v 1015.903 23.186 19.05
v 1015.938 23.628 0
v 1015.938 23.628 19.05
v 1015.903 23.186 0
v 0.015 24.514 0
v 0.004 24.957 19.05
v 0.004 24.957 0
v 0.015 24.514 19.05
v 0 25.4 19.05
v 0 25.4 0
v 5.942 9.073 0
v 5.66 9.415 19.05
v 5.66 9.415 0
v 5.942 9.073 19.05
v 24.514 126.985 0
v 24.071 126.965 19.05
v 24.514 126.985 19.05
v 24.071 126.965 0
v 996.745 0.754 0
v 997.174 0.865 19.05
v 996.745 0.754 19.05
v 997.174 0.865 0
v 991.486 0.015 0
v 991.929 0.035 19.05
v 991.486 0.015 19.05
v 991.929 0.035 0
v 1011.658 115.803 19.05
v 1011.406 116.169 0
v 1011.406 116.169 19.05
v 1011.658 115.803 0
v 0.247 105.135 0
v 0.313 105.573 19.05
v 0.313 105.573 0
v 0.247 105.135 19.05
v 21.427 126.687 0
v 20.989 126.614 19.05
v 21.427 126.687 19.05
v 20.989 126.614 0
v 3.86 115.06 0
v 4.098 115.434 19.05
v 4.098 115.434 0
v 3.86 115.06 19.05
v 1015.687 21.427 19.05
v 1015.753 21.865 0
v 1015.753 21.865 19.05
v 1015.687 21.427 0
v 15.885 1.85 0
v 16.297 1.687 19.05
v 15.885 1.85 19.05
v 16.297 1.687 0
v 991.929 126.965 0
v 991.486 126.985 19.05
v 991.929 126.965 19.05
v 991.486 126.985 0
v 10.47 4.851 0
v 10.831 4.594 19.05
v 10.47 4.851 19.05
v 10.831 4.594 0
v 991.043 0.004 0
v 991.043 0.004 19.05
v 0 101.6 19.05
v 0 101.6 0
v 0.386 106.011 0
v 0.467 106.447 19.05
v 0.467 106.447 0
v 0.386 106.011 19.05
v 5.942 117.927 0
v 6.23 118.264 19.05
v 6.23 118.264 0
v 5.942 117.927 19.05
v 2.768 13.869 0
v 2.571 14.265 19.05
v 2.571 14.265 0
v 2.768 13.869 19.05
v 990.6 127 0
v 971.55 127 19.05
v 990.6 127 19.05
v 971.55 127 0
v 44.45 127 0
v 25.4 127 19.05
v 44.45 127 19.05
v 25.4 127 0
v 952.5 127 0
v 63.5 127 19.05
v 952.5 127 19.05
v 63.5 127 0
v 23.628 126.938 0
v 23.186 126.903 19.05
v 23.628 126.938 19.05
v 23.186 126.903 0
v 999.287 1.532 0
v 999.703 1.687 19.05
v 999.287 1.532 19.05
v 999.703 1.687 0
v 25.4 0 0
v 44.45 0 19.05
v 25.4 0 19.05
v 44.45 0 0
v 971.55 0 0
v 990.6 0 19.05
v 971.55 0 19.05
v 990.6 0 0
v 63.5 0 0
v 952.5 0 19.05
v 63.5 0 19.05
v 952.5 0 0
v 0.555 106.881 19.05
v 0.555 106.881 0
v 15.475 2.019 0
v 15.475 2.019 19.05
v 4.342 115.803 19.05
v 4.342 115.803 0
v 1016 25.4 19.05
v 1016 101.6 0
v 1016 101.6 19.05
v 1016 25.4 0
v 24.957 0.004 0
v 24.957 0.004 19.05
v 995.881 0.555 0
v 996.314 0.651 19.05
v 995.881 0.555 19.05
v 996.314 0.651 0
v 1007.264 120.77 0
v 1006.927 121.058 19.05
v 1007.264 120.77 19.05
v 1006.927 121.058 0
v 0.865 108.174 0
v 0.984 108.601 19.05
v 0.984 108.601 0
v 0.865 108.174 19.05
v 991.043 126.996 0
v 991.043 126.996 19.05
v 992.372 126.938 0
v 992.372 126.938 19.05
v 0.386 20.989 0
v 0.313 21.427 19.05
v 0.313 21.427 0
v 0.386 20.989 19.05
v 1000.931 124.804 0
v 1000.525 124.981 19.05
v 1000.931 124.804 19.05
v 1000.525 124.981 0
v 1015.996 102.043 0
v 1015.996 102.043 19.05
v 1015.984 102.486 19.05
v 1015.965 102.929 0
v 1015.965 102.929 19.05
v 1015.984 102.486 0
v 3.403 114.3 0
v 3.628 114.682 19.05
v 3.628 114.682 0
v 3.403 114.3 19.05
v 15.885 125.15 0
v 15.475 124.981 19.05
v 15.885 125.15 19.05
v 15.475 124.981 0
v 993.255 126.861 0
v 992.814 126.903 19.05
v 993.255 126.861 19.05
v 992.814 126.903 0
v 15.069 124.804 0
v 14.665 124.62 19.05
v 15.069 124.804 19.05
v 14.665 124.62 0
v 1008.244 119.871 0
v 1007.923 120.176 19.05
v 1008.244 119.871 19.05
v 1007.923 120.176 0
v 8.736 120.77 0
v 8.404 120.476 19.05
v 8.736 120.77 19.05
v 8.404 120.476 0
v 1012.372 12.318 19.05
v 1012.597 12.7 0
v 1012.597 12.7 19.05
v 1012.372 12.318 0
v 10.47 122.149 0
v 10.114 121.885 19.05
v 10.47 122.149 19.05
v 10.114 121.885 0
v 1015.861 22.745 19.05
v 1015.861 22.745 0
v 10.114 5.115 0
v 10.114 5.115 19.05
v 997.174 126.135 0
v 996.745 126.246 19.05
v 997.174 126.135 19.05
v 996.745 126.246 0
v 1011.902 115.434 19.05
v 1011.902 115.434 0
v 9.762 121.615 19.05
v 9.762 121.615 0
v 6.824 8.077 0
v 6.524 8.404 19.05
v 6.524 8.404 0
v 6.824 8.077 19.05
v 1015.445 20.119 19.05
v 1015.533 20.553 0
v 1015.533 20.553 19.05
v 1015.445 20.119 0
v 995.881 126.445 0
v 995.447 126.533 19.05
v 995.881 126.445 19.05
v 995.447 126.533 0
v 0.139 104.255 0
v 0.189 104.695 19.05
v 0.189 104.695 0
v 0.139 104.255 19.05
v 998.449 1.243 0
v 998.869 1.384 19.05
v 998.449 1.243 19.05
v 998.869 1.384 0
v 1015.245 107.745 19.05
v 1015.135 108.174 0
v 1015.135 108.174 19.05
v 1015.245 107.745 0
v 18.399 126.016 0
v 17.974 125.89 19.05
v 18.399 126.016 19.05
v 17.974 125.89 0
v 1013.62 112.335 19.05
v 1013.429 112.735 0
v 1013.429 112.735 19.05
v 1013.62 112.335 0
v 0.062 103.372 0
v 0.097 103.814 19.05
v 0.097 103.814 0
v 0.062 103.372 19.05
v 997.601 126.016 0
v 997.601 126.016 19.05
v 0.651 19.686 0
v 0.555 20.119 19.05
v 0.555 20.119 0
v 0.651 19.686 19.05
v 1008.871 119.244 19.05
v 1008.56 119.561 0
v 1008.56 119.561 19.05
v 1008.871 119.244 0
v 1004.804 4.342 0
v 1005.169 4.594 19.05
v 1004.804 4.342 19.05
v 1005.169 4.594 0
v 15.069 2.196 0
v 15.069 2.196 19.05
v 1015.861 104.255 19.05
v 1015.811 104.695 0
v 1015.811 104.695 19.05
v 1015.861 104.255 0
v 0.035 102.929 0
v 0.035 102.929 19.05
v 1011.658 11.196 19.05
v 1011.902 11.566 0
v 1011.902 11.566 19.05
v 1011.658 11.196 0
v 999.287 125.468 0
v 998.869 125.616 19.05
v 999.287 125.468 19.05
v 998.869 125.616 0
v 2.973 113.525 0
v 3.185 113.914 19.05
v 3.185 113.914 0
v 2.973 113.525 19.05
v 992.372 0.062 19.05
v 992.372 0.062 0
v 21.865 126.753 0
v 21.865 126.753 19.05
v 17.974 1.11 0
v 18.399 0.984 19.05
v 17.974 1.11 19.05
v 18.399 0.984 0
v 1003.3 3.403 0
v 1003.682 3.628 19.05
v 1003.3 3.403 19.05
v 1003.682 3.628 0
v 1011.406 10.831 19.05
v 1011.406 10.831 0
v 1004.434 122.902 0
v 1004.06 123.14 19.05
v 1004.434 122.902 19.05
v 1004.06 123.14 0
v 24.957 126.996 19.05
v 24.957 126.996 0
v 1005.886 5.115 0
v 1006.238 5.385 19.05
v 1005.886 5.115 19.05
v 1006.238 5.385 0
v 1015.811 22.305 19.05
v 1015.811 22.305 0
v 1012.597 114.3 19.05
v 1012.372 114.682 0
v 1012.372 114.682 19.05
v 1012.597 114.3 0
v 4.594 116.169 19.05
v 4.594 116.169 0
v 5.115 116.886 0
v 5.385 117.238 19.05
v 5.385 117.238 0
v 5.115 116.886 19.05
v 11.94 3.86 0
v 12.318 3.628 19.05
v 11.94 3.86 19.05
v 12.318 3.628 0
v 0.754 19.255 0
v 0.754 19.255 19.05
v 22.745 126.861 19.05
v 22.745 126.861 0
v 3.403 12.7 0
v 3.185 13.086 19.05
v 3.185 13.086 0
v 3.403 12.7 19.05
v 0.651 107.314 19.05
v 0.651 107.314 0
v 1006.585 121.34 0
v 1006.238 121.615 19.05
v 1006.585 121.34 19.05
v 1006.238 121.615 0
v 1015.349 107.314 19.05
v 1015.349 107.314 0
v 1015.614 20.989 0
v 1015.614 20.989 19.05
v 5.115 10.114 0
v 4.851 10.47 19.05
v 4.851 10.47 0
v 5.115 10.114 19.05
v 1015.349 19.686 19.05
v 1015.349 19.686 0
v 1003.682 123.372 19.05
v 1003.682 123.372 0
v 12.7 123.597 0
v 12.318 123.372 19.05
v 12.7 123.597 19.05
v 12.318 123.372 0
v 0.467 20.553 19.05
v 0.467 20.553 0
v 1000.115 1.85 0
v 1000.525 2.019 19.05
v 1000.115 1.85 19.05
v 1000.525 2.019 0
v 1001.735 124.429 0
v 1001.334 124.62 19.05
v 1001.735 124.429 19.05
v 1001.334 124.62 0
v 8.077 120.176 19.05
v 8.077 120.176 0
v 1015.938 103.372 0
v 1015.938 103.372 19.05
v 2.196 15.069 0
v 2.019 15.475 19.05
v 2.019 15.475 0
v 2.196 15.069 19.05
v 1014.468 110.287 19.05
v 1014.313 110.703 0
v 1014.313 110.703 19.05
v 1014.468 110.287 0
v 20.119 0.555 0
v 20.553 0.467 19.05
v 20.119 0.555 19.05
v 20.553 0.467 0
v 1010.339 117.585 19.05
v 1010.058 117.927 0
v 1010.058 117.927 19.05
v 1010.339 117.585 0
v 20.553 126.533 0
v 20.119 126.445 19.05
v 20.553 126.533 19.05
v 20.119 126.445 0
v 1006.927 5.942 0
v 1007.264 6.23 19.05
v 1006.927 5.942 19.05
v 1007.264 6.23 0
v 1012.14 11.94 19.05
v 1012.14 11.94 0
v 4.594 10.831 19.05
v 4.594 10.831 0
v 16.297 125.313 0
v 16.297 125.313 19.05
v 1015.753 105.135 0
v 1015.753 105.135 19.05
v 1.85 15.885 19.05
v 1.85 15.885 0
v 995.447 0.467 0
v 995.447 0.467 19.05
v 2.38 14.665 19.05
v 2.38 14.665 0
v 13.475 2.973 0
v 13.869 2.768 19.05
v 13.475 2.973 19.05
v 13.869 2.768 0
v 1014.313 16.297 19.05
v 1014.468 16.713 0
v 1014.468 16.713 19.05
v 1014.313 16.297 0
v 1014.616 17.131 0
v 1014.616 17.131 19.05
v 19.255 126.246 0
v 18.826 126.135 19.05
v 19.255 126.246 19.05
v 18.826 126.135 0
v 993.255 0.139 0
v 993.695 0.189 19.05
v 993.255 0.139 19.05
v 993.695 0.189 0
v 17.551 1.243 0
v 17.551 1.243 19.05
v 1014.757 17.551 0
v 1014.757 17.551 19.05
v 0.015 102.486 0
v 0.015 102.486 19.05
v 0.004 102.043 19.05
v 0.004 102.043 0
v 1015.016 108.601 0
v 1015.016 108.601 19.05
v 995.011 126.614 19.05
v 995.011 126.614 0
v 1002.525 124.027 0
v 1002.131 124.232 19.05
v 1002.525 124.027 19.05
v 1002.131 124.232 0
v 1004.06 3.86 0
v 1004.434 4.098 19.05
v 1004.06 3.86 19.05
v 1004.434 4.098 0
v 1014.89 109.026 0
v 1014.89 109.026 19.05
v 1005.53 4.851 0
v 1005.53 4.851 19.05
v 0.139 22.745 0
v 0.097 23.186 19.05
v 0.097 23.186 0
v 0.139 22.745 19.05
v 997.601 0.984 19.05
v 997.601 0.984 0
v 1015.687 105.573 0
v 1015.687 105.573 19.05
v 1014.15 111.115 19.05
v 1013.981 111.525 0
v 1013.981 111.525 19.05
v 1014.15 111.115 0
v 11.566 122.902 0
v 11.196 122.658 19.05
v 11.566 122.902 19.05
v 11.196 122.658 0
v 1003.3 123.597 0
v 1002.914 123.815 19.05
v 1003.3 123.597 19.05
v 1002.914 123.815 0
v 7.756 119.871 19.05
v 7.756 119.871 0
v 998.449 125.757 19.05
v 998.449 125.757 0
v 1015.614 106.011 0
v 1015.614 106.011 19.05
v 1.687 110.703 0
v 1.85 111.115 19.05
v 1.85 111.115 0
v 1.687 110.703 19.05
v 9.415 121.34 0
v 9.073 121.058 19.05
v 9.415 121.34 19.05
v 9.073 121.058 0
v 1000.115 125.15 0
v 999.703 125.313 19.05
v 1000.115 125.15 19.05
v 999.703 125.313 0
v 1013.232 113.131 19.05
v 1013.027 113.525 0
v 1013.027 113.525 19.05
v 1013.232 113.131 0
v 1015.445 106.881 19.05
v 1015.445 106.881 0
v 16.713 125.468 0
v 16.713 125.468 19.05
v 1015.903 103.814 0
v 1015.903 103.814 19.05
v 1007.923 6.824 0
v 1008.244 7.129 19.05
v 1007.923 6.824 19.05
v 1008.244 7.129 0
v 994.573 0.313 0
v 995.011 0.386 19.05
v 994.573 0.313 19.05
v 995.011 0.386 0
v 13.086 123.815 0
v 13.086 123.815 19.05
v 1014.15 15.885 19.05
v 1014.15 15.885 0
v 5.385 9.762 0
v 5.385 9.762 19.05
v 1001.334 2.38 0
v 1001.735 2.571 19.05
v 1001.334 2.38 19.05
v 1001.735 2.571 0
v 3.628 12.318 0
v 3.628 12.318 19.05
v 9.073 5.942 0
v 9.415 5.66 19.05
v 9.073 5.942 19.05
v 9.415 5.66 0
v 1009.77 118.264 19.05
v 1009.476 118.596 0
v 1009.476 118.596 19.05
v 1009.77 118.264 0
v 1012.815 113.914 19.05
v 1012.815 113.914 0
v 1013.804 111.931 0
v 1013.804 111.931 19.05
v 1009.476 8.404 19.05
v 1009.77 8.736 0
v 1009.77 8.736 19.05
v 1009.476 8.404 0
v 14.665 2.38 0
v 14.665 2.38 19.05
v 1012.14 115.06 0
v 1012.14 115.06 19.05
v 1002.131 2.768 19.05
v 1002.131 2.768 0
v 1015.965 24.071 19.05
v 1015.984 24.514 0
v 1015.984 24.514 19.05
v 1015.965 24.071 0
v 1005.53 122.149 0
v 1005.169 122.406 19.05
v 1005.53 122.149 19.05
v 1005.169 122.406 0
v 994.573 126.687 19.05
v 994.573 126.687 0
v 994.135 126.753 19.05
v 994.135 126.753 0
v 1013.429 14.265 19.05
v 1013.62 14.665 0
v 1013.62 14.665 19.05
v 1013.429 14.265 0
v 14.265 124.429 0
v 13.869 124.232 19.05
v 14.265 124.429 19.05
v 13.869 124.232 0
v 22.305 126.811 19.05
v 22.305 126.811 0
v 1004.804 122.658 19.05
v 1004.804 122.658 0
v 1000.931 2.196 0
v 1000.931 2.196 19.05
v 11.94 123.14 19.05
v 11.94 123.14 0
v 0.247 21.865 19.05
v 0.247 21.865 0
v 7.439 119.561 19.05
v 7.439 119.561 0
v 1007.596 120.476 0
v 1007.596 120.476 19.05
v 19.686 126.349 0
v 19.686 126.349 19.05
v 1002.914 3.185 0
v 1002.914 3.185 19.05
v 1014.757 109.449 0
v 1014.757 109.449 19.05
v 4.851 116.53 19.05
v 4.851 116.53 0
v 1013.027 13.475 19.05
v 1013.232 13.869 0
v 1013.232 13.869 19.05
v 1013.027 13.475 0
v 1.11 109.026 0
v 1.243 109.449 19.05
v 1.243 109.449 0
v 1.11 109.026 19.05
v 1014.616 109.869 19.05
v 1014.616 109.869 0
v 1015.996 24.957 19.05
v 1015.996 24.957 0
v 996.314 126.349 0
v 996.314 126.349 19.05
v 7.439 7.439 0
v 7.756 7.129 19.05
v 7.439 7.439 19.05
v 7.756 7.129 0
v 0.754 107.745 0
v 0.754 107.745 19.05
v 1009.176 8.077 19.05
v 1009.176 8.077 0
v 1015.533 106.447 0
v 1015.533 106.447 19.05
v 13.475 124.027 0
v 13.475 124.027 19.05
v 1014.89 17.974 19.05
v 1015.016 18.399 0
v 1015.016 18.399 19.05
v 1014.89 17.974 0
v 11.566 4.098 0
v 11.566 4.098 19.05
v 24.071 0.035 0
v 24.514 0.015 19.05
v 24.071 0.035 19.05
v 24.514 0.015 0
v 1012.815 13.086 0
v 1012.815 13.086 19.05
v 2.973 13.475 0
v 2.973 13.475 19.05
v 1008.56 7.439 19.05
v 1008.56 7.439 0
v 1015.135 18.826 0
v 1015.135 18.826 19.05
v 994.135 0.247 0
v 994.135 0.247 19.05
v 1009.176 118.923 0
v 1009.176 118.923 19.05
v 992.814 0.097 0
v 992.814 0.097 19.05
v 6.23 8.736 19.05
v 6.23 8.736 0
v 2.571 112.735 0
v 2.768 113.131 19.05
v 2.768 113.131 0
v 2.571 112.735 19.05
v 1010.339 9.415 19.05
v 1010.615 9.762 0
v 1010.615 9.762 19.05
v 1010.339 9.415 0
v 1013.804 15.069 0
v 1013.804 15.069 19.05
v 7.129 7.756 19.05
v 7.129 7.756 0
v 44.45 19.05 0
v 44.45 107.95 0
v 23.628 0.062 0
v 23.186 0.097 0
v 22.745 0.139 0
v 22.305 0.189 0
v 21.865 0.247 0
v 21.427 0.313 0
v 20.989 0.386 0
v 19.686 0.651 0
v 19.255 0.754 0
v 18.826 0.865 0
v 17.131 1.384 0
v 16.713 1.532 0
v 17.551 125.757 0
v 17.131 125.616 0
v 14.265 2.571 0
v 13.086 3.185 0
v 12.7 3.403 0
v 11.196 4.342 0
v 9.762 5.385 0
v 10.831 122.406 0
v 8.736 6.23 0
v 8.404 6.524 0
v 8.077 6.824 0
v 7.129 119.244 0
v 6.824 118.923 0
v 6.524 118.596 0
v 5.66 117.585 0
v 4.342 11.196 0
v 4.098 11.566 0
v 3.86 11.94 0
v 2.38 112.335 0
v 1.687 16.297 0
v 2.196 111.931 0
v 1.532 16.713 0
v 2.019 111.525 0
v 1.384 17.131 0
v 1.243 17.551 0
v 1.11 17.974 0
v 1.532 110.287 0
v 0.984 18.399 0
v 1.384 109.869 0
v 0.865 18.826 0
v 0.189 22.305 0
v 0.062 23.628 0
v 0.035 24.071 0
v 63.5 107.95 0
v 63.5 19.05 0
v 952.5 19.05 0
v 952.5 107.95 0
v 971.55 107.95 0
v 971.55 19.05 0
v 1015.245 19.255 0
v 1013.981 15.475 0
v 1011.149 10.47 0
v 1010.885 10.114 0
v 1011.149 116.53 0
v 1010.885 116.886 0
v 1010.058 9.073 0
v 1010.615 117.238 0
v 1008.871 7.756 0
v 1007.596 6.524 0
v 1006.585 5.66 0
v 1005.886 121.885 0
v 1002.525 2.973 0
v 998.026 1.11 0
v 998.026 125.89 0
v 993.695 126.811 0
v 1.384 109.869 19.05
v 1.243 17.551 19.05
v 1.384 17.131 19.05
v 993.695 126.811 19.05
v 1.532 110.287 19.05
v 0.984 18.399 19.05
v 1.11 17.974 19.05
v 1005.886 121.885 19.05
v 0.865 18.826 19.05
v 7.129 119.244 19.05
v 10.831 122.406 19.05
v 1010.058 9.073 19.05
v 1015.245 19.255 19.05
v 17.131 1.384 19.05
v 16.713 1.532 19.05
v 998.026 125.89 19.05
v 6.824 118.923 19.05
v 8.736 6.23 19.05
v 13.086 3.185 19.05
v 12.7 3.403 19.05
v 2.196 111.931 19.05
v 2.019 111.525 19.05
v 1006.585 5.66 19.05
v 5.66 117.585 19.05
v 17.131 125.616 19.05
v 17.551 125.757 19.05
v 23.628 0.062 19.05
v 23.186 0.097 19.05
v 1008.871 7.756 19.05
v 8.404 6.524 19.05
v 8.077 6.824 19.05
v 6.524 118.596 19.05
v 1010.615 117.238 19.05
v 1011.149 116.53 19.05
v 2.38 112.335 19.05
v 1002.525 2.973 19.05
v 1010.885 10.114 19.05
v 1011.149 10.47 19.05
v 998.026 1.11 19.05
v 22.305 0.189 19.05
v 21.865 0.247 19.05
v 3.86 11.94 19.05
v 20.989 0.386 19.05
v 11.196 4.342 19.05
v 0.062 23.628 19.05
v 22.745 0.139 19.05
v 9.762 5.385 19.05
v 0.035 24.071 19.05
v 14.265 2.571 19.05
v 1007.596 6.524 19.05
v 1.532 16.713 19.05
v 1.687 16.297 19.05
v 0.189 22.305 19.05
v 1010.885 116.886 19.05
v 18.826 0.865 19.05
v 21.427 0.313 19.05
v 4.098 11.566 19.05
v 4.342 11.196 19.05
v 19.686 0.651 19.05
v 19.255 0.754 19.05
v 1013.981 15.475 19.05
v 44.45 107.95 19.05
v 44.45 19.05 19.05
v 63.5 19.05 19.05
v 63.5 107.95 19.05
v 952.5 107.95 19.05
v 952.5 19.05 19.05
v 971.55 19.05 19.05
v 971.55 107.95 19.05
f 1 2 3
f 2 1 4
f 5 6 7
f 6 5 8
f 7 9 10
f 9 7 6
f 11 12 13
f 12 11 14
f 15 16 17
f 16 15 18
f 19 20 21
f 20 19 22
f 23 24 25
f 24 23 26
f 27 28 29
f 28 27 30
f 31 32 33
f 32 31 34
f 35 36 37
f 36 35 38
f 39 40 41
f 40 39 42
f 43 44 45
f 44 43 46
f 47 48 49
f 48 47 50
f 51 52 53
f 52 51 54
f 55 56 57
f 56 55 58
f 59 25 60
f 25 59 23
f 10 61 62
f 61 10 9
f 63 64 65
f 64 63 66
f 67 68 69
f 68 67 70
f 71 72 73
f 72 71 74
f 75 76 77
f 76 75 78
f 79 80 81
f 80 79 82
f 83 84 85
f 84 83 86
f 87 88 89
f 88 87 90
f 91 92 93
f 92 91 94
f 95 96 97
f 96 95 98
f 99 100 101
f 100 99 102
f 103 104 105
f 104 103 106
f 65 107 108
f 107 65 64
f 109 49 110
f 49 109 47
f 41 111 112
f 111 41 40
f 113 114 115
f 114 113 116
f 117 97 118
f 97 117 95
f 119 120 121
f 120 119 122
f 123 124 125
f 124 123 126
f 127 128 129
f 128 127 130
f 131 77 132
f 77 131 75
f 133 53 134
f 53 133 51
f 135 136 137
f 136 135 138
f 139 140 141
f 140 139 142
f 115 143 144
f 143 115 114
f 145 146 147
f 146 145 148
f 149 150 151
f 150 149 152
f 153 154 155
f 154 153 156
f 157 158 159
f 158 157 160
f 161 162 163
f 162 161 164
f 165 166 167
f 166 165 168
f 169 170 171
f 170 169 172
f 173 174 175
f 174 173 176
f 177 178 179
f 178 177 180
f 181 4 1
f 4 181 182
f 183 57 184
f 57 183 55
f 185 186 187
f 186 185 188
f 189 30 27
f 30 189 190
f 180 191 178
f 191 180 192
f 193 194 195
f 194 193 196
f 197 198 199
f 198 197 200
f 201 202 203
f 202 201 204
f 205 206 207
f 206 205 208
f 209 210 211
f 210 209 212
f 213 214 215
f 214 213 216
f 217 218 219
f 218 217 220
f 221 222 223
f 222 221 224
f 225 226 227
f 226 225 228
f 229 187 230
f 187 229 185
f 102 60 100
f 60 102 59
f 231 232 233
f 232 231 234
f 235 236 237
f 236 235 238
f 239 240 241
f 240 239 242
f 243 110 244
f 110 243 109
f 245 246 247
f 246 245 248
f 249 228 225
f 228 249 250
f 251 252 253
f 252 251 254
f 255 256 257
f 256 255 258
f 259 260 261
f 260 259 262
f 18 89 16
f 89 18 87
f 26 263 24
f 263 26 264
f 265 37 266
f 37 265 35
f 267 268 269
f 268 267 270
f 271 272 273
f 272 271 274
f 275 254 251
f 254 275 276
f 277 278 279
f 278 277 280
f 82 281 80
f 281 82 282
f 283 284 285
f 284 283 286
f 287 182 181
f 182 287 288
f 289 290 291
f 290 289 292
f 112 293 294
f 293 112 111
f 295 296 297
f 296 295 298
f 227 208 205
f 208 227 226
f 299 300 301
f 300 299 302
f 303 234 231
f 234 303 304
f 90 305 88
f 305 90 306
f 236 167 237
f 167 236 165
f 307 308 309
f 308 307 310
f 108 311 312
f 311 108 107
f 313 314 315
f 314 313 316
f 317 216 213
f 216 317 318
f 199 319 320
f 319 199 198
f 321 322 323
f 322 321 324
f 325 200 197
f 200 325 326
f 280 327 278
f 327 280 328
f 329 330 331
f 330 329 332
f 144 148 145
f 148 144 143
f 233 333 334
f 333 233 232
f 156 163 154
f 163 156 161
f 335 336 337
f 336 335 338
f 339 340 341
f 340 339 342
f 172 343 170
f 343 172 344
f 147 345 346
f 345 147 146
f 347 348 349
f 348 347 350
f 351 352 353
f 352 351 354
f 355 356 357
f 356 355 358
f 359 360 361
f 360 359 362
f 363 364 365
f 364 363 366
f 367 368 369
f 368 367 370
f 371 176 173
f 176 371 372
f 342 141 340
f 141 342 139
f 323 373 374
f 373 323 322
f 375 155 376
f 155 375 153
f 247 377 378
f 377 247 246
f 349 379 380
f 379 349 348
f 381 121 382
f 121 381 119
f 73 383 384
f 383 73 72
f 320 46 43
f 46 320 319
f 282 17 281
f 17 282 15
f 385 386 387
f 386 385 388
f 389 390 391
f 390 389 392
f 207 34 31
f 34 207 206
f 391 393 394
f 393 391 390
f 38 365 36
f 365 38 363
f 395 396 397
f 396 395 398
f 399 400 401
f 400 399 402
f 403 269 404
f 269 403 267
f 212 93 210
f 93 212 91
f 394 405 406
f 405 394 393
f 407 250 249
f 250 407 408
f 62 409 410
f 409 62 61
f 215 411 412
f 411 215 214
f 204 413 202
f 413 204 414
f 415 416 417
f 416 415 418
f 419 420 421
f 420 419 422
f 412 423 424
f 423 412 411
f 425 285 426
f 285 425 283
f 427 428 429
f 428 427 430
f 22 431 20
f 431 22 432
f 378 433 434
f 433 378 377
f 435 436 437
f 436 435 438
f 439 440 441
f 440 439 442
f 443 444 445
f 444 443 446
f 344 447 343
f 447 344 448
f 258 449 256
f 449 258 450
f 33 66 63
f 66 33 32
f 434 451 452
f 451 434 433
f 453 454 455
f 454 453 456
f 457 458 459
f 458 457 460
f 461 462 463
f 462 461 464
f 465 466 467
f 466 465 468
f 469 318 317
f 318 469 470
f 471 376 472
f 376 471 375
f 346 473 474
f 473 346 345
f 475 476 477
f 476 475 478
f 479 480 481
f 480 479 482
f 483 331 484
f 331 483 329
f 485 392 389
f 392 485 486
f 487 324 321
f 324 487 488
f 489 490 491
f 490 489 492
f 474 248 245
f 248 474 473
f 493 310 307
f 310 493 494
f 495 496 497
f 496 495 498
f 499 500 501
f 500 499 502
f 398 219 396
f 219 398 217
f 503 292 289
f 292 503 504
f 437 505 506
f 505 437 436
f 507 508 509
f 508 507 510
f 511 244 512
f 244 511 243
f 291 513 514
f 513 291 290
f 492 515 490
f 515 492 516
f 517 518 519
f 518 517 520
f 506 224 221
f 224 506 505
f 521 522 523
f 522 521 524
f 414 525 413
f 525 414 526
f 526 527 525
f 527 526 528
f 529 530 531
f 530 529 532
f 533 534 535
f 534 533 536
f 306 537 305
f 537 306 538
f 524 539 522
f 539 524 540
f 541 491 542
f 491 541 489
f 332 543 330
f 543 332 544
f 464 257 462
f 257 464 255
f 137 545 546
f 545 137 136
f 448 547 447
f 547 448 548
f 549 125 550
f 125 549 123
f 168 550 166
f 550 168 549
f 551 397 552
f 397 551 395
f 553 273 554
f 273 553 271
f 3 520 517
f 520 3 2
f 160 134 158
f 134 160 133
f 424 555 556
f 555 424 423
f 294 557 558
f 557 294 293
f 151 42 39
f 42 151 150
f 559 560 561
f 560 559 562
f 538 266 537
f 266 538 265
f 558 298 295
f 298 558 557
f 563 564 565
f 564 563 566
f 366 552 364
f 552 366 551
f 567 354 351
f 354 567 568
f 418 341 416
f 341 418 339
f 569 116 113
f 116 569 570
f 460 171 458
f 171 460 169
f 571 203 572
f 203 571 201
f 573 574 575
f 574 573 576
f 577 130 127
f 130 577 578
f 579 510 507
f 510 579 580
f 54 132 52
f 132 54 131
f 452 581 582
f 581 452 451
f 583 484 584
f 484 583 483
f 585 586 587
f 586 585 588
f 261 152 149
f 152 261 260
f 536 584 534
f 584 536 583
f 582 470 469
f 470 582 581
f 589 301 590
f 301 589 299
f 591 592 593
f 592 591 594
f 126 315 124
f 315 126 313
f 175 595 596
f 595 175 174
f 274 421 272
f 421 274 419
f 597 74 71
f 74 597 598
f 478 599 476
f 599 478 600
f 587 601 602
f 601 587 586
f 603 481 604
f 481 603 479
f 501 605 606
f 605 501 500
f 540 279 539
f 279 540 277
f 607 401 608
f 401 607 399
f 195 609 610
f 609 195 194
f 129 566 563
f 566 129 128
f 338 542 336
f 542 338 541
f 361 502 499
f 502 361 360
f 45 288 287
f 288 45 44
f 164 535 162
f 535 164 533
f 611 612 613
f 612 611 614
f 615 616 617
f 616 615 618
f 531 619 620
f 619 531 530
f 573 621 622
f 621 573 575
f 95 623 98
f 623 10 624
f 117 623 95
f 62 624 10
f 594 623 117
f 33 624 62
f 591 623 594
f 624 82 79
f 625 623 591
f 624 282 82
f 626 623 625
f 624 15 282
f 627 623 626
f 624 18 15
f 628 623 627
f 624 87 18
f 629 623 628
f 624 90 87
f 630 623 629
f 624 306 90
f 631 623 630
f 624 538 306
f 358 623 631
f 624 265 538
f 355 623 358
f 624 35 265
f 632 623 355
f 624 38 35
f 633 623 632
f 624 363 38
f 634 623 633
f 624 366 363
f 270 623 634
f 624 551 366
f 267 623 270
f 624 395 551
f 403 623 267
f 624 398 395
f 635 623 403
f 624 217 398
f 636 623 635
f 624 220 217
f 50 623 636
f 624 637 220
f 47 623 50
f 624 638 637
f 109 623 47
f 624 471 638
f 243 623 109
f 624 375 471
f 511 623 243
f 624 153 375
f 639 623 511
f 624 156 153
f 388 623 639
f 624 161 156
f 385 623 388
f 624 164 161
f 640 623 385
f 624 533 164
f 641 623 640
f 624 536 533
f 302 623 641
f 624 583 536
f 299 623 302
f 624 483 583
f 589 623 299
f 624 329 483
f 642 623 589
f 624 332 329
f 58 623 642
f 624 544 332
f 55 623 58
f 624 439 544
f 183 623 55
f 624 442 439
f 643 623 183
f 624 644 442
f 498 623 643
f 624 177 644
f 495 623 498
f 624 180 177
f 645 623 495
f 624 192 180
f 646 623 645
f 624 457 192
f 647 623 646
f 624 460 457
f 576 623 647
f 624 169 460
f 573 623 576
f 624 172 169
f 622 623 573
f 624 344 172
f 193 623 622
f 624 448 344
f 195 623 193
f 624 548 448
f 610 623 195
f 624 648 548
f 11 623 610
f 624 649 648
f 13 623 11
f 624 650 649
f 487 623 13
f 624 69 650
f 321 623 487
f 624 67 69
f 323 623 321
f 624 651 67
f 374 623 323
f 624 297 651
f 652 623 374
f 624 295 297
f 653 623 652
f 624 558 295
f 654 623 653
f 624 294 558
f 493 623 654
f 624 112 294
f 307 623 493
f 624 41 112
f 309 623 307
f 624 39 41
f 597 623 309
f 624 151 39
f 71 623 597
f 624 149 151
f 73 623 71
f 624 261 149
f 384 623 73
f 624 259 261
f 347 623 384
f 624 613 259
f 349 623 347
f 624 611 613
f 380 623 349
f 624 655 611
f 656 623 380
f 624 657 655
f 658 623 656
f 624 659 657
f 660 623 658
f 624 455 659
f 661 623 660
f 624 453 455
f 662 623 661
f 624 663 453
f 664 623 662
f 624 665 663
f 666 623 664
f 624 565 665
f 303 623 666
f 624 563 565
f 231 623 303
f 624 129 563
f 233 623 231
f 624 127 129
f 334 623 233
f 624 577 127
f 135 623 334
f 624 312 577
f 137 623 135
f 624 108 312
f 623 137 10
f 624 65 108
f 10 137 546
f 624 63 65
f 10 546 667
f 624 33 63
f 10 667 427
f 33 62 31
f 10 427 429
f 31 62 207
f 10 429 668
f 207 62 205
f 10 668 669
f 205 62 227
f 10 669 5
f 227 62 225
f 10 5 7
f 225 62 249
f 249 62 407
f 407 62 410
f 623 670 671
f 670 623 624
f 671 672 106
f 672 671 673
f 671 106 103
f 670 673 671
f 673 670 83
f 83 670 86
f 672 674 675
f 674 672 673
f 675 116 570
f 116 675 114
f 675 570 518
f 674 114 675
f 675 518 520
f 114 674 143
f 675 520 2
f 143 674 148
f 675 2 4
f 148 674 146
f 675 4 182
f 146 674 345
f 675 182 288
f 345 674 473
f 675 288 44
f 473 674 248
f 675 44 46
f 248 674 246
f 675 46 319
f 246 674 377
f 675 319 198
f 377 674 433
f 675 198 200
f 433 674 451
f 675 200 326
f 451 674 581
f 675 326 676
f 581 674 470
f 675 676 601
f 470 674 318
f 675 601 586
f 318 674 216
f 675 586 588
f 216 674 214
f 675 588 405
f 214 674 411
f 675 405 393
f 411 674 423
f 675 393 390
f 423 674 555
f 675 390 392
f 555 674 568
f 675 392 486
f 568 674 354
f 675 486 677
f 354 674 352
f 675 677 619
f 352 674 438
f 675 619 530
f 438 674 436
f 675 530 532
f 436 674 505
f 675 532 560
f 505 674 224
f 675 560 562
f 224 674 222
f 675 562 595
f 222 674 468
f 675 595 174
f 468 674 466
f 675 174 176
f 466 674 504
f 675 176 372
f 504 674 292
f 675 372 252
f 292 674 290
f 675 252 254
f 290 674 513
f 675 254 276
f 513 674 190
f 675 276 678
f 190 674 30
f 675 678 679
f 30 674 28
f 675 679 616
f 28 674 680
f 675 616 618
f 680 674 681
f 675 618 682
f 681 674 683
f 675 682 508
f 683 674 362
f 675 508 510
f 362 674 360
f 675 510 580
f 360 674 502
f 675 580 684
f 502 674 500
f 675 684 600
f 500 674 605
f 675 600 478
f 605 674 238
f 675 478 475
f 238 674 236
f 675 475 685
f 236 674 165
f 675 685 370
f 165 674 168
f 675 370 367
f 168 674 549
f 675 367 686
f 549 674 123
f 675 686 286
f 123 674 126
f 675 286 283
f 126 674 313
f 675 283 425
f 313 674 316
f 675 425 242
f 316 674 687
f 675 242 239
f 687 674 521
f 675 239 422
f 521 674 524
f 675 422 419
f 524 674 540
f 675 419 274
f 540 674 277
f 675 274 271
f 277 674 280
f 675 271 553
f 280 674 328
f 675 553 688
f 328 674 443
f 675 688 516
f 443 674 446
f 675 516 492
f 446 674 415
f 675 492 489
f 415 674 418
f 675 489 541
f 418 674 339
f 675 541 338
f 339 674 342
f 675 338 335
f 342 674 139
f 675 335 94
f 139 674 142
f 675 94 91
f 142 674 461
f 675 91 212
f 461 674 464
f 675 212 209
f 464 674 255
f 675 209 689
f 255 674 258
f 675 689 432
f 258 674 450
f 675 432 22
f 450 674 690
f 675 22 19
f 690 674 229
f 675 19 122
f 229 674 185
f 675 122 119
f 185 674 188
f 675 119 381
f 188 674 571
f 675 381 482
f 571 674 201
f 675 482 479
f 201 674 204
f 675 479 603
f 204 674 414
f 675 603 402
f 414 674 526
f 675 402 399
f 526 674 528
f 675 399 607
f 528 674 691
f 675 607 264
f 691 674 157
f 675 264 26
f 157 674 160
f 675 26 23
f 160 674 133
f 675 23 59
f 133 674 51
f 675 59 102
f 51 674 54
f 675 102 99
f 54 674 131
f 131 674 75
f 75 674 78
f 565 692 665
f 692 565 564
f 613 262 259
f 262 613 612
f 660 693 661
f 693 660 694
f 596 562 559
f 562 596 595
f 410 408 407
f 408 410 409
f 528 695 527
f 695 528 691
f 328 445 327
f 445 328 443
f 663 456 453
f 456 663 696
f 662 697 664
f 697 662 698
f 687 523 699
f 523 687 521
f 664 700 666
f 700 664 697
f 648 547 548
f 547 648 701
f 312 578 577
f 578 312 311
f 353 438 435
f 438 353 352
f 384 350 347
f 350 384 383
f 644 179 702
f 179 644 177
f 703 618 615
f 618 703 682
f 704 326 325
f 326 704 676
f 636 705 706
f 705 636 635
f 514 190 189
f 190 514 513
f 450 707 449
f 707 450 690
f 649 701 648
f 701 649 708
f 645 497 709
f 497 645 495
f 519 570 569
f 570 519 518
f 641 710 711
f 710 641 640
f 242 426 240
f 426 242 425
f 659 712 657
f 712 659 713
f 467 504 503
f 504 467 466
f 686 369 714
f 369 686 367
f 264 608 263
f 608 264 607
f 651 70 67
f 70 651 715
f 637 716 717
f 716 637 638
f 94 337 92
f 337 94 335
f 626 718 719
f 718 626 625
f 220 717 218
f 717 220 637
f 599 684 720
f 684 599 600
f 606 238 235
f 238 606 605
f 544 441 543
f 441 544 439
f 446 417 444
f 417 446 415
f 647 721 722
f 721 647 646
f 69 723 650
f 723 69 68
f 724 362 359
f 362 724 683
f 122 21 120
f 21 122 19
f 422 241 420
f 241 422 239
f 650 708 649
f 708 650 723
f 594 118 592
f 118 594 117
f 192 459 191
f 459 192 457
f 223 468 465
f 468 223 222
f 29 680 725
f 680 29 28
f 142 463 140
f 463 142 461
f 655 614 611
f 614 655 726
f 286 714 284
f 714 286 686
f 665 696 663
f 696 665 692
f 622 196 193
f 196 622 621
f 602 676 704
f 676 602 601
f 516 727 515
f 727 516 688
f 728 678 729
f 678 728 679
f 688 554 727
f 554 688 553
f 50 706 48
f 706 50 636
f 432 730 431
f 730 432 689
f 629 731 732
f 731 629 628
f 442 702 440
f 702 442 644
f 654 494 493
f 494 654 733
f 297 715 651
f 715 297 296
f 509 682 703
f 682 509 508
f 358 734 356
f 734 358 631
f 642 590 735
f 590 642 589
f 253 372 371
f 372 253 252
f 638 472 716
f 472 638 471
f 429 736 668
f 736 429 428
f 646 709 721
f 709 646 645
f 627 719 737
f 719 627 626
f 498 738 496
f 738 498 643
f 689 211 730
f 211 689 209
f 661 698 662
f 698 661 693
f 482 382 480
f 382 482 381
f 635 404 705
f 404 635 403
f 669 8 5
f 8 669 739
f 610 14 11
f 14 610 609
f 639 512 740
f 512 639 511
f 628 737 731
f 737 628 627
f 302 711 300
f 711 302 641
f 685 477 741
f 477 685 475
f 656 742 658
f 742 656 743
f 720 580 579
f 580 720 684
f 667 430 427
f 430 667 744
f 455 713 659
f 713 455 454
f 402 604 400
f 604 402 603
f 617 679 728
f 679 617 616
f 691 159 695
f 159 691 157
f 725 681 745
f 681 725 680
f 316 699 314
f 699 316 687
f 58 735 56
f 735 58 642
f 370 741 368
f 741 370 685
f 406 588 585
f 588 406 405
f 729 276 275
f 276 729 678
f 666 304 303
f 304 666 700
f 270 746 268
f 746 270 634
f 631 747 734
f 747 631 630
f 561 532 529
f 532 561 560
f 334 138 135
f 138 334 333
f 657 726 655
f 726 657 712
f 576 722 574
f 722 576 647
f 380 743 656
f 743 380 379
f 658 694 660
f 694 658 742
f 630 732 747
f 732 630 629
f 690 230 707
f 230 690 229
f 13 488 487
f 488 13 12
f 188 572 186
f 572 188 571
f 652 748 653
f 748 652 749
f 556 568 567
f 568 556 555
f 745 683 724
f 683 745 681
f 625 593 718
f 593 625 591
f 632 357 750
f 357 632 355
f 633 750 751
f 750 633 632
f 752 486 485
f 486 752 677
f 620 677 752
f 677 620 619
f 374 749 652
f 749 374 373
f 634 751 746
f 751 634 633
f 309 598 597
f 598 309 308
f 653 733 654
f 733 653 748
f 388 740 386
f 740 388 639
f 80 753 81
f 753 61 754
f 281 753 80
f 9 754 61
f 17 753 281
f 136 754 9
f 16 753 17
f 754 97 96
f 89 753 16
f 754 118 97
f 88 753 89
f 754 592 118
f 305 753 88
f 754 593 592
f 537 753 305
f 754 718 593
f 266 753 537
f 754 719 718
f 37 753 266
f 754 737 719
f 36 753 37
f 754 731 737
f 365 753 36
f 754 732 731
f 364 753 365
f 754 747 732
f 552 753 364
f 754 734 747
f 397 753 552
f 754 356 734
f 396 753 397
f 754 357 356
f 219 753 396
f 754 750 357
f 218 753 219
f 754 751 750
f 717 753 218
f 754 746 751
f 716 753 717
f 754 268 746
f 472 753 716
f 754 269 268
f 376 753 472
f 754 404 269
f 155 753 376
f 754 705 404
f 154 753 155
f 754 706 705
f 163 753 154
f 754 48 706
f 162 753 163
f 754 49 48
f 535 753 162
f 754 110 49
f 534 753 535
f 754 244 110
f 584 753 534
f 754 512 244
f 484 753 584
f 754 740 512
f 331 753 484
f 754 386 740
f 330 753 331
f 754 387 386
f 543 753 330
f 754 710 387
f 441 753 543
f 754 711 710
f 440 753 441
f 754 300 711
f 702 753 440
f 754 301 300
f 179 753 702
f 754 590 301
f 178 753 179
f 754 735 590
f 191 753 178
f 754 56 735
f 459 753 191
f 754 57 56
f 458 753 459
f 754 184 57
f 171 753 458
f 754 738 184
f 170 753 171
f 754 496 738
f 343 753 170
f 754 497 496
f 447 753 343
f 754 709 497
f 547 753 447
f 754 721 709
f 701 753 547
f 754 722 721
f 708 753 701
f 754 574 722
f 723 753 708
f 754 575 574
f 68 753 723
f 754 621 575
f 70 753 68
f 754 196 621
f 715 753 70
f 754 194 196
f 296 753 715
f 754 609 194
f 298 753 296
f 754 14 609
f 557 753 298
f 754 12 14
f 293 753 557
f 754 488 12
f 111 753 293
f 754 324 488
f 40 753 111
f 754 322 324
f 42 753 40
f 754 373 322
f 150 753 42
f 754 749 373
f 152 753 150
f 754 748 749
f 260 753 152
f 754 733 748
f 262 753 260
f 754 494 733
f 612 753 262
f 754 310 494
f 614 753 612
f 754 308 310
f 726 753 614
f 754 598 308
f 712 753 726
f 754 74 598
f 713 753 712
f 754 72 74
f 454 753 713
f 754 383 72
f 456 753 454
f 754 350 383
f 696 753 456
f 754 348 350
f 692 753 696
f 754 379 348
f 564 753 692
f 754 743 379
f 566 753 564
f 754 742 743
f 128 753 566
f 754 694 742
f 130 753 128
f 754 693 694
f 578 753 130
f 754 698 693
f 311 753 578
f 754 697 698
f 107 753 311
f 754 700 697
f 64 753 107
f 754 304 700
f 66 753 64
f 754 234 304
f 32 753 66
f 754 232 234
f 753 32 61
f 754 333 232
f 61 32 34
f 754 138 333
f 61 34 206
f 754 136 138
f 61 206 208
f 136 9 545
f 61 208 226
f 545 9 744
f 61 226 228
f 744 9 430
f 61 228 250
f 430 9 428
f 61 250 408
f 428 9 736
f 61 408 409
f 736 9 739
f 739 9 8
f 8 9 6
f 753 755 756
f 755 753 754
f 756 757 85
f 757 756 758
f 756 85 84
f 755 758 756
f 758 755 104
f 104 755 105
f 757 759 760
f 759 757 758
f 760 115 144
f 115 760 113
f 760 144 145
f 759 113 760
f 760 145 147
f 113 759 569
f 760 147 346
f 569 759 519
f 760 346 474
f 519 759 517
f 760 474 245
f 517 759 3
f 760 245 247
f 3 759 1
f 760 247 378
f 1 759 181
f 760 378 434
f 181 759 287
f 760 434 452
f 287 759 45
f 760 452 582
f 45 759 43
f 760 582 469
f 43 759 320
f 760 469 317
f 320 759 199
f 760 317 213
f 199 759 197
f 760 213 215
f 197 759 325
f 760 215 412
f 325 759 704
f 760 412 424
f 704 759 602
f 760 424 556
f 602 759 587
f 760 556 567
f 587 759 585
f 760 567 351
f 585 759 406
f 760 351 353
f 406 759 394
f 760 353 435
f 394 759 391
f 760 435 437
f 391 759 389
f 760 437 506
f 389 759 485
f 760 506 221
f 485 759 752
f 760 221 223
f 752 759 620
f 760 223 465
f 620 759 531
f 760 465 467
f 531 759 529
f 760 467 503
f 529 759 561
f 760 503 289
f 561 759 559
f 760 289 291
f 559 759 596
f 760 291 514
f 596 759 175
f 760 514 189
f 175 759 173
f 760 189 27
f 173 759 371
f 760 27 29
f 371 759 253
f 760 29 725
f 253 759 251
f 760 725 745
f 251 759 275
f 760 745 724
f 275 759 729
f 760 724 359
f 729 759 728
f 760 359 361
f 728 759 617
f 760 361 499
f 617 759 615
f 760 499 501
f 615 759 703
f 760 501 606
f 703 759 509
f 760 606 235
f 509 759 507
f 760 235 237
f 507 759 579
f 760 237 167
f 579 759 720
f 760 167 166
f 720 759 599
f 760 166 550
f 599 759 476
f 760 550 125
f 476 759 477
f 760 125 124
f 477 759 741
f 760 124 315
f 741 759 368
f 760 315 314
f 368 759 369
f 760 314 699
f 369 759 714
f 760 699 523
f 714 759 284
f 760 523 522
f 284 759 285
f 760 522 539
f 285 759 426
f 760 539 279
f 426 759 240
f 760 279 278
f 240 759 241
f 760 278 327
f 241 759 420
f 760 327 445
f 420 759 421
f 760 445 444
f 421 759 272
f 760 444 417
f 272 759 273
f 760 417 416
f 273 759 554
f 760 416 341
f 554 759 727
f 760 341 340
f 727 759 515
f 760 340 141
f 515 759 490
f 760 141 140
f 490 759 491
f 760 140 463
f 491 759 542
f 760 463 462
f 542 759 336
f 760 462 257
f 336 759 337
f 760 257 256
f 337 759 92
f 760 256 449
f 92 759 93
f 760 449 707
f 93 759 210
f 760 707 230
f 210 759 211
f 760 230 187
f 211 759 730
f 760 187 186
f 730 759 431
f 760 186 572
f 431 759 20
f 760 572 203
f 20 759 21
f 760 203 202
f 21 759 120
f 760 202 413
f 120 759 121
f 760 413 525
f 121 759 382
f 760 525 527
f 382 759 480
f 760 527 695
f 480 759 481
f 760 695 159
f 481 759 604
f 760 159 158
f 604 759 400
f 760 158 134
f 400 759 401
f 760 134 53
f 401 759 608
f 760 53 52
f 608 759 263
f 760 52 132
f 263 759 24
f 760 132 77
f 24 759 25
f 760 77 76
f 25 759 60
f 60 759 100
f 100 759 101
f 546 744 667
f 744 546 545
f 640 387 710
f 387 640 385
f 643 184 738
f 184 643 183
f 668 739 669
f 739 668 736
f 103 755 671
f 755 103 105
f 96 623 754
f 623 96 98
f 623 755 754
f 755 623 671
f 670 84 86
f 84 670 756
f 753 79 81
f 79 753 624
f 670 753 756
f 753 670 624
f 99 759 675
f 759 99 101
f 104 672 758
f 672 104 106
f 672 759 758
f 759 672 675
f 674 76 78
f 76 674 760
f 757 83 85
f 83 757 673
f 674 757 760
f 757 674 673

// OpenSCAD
// Parametric Standing Desk Hutch
$fn=360;
in2mm = 25.4;

deskWidth = 40;
woodThickness = 0.75;

roundedCornerRadius = 1;

//dont change these variables, theyre dependant on vars you can change
deskWidthMM = deskWidth*in2mm;
woodThicknessMM = woodThickness*in2mm;
roundedCornerRadiusMM = roundedCornerRadius*in2mm;

module roundedRect(size, radius)
{
    x = size[0];
    y = size[1];
    z = size[2];
    linear_extrude(height=z)
        hull()
        {
            // place 4 circles in the corners, with the given radius
            translate([radius, radius, 0])
            //translate([(-x/2)+(radius/2), (-y/2)+(radius/2), 0])
            circle(r=radius);// origin

            translate([x-radius, radius, 0])
            circle(r=radius);// origin + x

            translate([radius, y-radius, 0])
            circle(r=radius);// origin + y

            translate([x-radius, y-radius, 0])
            circle(r=radius);// origin + x & y
        }
}


/***************************************************************************
* small crossbar for stabilizing the walls
***************************************************************************/
module crossBar(width=deskWidthMM, thickness=woodThicknessMM,depth = 5*in2mm)
{
    difference()
    {
        roundedRect([width, depth, thickness], roundedCornerRadiusMM);
        //origin side
        translate([roundedCornerRadiusMM+thickness,0,0])
        cube([thickness, thickness, thickness]);        
        translate([roundedCornerRadiusMM+thickness,depth-thickness,0])
        cube([thickness, thickness, thickness]);
        //other side
        translate([width-roundedCornerRadiusMM-thickness*2,0,0])
        cube([thickness, thickness, thickness]);
        translate([width-roundedCornerRadiusMM-thickness*2,depth-thickness,0])
        cube([thickness, thickness, thickness]);
    }
}



crossBar();
